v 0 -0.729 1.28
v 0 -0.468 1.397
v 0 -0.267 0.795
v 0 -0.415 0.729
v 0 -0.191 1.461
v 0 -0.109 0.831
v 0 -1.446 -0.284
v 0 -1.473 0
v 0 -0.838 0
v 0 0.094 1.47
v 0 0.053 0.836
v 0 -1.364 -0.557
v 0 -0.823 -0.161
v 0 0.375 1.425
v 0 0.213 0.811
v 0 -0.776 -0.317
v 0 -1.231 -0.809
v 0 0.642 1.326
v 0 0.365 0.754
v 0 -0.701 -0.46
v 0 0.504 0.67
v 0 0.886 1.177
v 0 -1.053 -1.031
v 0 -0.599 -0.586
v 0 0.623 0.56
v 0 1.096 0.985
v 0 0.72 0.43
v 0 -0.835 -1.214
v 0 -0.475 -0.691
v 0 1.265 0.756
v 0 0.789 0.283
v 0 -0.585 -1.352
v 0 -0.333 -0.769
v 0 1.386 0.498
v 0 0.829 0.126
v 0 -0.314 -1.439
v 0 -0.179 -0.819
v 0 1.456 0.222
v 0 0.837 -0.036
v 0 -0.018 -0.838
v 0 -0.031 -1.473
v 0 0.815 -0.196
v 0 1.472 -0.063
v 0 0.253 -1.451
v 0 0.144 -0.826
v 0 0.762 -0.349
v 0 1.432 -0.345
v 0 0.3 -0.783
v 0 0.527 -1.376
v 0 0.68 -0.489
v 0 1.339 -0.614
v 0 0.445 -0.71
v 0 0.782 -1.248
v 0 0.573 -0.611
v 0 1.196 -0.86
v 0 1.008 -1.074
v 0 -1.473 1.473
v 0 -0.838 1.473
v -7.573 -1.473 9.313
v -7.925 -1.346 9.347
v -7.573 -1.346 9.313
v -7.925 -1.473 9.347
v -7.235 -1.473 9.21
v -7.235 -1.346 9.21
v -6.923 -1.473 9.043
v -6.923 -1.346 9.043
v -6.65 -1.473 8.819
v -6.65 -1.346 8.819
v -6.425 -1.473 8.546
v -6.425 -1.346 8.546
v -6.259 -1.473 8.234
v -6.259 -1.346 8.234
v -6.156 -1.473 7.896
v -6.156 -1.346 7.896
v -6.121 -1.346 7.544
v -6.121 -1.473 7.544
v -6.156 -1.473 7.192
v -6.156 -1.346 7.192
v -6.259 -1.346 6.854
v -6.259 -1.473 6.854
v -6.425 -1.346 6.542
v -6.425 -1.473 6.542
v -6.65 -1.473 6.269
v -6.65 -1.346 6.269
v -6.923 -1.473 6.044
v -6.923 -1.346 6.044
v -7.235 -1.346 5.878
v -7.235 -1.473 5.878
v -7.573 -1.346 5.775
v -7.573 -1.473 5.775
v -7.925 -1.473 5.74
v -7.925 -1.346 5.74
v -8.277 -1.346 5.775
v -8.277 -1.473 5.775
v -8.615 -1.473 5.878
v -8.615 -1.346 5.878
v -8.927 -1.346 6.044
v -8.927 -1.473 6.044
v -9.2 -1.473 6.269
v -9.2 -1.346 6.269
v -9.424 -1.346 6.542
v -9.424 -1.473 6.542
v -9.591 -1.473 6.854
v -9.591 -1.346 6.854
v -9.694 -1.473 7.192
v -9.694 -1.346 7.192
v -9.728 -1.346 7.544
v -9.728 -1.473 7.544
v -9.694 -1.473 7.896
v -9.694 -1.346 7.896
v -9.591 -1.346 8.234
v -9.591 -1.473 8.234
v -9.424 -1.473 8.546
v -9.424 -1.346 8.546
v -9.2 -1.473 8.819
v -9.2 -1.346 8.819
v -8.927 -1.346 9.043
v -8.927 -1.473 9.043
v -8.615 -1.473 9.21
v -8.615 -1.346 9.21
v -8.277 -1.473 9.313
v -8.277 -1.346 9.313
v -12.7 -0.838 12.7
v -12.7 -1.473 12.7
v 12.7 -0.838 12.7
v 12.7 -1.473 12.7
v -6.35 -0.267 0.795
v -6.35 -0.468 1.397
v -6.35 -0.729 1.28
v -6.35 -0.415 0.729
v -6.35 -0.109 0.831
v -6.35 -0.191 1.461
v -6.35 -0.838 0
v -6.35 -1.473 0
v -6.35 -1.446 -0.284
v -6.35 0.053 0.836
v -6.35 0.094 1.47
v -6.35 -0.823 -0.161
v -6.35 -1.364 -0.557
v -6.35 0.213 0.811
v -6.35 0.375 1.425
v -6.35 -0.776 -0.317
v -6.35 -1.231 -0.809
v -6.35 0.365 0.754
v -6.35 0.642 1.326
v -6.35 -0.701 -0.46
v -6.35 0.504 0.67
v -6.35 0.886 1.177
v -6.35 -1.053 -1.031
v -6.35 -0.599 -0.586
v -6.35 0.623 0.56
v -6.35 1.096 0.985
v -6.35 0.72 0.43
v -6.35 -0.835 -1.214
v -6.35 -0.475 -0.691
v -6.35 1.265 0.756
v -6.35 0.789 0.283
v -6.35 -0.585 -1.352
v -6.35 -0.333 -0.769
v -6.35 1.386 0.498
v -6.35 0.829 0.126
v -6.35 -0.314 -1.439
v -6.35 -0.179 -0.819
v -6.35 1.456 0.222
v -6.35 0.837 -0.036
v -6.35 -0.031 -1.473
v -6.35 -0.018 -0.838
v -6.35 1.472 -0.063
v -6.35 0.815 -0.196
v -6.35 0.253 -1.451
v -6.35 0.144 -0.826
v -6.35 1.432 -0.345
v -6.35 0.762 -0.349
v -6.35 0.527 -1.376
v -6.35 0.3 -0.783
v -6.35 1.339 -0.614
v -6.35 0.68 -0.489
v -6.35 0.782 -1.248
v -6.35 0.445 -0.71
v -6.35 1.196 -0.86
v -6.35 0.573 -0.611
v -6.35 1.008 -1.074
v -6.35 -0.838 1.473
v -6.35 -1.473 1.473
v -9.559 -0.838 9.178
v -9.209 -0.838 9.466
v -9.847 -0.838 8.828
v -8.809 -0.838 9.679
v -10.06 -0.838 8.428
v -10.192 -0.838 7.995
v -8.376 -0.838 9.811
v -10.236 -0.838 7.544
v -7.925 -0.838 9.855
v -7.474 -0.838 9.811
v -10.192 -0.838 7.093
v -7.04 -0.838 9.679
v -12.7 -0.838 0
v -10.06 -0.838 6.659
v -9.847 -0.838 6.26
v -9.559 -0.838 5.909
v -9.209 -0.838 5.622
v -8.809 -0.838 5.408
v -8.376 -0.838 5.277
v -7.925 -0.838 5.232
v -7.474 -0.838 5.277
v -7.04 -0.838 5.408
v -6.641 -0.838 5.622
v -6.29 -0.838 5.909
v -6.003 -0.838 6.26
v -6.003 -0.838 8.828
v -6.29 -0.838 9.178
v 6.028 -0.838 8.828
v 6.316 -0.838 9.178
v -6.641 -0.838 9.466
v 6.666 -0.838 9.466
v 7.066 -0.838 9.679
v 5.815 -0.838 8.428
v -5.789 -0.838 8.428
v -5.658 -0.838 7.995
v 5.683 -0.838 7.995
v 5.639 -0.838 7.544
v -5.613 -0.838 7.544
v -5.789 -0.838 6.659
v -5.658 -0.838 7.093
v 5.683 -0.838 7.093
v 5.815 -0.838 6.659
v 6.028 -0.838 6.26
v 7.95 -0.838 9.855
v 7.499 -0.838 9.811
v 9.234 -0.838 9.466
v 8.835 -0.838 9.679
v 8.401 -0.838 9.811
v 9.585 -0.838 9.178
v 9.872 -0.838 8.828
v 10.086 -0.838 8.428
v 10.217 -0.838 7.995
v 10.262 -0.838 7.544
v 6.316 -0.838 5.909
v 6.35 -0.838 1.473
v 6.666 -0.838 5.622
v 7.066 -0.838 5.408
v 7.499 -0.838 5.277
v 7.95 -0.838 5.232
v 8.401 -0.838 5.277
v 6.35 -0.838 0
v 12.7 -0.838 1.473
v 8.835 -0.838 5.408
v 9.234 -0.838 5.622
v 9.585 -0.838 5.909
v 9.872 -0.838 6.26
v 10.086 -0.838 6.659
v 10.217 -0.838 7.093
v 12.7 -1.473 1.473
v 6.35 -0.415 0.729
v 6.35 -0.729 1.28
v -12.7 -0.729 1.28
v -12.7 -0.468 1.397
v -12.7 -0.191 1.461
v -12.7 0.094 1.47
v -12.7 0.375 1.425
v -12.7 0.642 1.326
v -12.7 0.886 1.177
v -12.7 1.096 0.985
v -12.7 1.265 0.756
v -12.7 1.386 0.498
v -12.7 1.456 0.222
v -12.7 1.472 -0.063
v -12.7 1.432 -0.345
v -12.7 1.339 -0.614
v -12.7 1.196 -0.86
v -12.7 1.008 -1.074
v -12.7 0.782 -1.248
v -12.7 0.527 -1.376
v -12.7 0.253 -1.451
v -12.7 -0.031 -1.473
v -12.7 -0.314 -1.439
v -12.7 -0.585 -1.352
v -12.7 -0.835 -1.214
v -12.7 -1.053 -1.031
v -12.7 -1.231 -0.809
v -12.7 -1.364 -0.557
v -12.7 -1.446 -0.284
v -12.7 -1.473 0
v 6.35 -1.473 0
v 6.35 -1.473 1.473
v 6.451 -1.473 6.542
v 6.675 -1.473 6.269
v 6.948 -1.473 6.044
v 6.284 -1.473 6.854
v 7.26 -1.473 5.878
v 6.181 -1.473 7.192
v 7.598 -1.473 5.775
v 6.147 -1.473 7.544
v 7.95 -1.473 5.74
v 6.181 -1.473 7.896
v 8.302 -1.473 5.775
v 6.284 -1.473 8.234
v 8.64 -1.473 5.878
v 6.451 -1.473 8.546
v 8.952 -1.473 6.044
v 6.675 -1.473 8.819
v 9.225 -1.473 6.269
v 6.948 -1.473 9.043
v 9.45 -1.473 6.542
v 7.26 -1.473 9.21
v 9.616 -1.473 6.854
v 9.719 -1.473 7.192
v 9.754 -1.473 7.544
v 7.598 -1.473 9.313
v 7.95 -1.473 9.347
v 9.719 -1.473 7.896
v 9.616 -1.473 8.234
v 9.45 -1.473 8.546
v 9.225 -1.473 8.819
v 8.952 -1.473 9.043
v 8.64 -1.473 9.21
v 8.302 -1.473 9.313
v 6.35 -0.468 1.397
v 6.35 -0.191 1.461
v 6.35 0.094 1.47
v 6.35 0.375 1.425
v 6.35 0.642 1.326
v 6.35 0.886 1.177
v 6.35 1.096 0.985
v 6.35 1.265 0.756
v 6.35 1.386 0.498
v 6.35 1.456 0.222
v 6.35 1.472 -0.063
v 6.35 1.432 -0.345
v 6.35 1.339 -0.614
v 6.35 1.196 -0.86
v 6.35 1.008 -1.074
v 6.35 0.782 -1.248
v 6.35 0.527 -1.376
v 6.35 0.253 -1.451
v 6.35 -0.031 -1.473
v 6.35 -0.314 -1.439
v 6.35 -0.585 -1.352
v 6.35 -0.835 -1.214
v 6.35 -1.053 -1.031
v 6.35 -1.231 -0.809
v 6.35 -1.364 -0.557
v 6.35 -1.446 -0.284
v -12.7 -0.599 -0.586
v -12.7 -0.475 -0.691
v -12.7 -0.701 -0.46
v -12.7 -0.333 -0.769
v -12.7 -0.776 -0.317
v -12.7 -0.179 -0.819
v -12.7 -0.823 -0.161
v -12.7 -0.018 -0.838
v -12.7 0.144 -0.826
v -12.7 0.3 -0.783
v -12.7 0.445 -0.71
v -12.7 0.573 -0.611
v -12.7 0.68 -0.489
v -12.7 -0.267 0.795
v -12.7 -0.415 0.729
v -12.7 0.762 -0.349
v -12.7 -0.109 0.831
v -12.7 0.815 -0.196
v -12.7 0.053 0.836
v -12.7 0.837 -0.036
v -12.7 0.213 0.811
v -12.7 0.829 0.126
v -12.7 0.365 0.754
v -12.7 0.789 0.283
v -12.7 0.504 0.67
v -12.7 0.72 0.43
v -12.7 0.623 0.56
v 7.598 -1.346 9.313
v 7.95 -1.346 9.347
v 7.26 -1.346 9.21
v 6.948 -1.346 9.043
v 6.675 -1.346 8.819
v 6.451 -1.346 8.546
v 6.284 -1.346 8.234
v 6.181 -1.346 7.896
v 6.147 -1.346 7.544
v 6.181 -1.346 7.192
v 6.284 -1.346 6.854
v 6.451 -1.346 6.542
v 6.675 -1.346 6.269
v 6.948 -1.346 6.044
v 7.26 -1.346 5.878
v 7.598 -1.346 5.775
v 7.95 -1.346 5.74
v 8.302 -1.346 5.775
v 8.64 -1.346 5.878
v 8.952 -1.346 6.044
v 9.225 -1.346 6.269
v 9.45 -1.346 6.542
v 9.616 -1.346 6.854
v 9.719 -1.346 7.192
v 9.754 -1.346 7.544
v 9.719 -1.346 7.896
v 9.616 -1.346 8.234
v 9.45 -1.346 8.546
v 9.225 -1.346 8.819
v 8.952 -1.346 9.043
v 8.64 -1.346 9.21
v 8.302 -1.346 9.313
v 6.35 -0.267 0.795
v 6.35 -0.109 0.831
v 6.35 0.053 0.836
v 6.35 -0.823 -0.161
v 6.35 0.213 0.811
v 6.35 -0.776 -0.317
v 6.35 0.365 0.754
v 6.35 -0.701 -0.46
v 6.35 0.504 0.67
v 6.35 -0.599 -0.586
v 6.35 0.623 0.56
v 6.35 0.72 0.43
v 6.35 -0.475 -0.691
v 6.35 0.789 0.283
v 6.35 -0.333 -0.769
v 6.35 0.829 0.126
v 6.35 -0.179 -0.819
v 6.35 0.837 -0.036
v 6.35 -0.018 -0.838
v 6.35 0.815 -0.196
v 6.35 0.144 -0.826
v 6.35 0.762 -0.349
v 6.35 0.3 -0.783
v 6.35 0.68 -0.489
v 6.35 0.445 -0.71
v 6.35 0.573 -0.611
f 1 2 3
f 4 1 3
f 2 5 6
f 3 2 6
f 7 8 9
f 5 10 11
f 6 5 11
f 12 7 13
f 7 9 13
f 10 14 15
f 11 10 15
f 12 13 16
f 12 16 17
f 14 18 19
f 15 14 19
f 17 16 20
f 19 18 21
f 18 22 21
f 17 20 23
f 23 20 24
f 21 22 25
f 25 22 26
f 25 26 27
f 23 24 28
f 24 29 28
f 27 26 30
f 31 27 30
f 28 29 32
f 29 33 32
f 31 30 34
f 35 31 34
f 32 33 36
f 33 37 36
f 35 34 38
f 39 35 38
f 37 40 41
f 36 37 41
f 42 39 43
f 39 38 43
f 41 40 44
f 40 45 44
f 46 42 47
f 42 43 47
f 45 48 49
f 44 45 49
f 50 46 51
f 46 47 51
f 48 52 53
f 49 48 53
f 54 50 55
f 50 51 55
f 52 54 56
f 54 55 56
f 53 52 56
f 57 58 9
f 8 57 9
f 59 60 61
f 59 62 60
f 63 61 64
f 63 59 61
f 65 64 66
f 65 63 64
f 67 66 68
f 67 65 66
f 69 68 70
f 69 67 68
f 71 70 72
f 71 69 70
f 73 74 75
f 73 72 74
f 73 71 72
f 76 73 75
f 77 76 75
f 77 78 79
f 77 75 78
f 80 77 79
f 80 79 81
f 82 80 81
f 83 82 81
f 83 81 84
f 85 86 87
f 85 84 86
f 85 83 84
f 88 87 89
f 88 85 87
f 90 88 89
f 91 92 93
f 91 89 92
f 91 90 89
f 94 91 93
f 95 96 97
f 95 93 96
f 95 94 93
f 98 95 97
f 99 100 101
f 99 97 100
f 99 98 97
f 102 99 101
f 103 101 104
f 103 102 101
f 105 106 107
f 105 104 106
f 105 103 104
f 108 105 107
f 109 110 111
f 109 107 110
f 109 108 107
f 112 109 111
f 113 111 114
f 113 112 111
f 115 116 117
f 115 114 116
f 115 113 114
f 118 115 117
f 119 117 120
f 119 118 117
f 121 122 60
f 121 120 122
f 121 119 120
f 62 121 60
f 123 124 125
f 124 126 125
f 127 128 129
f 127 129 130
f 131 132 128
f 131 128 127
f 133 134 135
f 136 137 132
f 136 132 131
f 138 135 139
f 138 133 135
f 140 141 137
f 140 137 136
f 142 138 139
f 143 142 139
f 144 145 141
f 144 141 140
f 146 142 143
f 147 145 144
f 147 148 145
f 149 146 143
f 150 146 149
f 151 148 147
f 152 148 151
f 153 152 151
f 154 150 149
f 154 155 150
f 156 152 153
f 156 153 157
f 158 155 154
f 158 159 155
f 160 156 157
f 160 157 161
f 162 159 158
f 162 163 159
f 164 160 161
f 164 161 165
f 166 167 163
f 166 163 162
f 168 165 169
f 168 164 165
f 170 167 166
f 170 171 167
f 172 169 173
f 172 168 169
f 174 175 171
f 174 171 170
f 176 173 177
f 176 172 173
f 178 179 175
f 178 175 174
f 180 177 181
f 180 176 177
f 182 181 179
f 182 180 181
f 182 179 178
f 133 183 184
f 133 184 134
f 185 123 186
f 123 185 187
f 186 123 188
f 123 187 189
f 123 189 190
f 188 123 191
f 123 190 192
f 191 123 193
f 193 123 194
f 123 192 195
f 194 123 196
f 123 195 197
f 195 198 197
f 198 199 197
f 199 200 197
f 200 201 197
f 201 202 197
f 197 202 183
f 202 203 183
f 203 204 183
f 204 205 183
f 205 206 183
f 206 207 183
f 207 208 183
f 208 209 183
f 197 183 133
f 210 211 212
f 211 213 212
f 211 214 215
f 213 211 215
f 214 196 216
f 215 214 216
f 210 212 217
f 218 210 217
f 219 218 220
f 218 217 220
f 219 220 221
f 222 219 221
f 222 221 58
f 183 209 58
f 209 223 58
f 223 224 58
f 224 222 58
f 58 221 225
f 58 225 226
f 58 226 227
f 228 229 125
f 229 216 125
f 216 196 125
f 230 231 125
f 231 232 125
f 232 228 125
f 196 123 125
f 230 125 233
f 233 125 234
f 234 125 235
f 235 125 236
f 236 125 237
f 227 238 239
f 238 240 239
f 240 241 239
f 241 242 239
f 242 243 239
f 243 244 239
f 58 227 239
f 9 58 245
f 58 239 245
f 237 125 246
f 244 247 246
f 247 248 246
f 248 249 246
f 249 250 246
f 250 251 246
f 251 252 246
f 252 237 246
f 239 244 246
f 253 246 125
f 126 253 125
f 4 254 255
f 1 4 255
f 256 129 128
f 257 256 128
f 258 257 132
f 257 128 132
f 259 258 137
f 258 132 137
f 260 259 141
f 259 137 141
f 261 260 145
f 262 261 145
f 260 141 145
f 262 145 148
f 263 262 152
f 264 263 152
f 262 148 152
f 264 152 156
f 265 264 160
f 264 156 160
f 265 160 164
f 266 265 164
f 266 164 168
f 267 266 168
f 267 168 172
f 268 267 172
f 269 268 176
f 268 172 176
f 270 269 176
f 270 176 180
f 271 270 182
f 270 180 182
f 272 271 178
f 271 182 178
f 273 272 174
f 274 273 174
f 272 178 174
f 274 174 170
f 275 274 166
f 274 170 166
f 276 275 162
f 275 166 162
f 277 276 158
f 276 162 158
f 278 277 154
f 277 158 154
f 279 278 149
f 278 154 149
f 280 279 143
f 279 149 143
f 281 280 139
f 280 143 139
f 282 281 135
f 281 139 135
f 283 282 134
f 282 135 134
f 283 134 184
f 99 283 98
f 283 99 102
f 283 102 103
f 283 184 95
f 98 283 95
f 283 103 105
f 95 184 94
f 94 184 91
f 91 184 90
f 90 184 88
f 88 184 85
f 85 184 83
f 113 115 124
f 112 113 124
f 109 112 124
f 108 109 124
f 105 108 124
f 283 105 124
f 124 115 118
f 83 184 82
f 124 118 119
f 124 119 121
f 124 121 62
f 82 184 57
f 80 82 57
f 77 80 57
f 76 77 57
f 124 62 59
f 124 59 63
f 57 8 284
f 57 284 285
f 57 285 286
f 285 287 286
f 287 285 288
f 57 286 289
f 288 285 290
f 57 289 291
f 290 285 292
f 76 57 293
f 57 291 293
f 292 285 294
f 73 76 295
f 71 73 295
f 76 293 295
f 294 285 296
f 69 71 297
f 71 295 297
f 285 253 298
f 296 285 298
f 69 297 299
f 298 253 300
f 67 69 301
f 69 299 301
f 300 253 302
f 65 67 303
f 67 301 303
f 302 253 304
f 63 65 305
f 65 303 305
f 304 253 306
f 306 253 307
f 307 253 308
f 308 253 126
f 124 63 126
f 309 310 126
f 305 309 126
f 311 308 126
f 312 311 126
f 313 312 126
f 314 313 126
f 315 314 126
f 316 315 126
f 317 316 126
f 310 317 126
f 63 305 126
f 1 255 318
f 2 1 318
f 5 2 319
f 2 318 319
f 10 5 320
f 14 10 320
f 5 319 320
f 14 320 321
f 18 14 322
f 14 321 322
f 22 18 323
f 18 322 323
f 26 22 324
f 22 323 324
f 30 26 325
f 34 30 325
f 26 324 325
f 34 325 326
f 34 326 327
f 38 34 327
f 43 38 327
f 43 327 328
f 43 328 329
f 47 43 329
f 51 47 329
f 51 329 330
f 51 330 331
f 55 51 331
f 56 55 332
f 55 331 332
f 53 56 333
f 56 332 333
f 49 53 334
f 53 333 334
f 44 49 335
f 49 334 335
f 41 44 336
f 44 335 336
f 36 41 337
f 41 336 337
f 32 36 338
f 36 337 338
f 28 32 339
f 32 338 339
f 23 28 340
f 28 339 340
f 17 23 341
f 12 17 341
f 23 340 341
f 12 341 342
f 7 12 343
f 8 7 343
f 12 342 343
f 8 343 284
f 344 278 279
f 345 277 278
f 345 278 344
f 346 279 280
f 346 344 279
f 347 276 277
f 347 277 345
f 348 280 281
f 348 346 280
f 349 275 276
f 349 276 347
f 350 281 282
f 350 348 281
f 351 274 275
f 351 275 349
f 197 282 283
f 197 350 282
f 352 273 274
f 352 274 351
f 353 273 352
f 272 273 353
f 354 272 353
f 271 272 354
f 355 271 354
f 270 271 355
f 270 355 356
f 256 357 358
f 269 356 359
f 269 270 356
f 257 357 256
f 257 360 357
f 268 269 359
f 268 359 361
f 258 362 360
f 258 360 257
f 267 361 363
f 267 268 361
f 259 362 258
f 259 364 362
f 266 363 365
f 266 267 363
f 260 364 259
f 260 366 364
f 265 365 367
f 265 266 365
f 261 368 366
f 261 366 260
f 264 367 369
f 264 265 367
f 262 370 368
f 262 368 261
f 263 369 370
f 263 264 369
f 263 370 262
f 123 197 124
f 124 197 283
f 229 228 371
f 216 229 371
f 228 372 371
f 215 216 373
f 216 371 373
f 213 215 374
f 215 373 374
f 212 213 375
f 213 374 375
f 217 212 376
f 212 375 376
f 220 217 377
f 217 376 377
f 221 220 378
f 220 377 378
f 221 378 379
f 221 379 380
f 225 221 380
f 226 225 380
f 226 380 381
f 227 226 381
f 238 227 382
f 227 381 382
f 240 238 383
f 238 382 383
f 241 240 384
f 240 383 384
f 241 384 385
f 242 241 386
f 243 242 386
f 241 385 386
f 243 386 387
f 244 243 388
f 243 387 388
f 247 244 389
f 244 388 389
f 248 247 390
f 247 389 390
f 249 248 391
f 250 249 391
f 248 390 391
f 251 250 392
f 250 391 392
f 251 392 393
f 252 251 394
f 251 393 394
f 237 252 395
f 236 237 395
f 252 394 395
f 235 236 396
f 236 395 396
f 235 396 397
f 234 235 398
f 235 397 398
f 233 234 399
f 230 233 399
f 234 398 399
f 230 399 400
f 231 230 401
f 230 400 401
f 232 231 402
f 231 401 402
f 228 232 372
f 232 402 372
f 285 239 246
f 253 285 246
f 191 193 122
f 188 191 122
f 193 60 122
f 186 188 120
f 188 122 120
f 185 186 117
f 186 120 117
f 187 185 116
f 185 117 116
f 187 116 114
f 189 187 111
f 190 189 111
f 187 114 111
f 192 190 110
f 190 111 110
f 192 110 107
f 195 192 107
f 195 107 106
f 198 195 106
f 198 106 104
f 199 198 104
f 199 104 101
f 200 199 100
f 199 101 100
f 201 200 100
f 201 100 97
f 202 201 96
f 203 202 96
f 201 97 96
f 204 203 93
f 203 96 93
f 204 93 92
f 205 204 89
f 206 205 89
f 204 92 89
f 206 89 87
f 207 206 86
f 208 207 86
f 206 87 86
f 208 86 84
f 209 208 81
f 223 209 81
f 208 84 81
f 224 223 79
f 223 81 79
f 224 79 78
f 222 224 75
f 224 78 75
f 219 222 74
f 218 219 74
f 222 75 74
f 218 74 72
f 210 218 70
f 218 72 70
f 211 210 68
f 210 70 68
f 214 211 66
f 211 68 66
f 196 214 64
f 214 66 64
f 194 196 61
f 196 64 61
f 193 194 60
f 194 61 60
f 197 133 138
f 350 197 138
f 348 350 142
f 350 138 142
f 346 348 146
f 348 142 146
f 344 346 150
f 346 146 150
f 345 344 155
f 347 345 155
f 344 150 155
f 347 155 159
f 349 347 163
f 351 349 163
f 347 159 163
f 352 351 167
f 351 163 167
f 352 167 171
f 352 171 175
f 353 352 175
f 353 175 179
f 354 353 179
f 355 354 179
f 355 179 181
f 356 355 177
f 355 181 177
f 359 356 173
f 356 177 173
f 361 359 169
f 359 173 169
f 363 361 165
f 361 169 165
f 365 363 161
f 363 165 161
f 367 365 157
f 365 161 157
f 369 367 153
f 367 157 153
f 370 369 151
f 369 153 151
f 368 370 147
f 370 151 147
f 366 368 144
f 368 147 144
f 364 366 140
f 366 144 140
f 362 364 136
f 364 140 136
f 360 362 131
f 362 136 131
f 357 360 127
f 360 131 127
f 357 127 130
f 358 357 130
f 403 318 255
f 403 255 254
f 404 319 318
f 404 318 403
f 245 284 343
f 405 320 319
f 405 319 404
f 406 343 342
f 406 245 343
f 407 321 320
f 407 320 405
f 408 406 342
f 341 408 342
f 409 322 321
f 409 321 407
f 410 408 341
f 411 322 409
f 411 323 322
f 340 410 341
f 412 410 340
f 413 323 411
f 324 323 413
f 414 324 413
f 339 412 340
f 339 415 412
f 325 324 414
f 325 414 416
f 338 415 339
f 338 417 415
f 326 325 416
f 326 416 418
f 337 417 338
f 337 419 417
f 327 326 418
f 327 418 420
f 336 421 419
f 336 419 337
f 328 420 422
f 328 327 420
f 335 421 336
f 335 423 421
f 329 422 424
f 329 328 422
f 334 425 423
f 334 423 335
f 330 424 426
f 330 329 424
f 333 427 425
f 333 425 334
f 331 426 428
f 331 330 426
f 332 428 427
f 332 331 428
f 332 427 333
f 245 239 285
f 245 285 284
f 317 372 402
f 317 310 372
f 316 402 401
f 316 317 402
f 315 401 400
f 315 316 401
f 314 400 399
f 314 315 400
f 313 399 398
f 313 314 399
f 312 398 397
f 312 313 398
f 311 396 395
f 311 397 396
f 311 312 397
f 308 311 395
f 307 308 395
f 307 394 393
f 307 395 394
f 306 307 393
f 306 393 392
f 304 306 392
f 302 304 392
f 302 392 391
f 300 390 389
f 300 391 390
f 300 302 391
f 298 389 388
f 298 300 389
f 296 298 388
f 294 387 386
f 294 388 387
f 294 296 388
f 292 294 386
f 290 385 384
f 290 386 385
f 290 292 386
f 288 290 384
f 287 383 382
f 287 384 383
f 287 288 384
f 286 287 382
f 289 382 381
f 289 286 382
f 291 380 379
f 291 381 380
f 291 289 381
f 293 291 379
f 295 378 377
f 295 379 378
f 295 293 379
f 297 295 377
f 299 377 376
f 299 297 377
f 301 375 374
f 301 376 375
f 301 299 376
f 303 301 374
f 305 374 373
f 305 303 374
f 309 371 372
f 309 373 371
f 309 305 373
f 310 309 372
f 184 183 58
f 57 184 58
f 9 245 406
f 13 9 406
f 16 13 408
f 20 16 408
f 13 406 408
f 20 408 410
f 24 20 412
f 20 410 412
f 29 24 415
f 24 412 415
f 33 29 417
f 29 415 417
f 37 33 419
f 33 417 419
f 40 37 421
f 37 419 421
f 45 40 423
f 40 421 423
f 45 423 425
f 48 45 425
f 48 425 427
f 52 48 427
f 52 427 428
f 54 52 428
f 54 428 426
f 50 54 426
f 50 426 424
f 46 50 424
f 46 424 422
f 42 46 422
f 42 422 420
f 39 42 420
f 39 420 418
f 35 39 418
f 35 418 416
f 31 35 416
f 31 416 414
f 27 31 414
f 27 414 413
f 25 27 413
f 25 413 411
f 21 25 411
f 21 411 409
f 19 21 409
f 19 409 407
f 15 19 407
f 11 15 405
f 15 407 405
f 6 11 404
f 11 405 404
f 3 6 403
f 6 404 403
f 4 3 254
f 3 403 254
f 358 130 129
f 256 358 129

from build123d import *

# Parameters (mm, degrees)
BOSS_EXTRUDE1_DEPTH     = 12.7
SKETCH4_W               = 6.35
SKETCH4_H               = 2.9464
CUT_EXTRUDE1_DEPTH      = 19.020830121
LPATTERN1_COUNT         = 6
LPATTERN1_PITCH         = 12.7
CUT_EXTRUDE3_DEPTH      = 19.020830121
CUT_EXTRUDE3_DEPTH_BACK = 19.020830121
SKETCH9_R               = 1.8034


with BuildPart() as part:
    # Sketch3 → Boss-Extrude1 (new, symmetric)
    with BuildSketch(Plane(origin=(0, 0, 0), x_dir=(0, 0, -1), z_dir=(1, 0, 0))):
        with BuildLine():
            Line((0, -1.4732), (-12.7, -1.4732))
            Line((-12.7, -1.4732), (-12.7, -0.8382))
            Line((-12.7, -0.8382), (0, -0.8382))
            ThreePointArc((0, -0.8382), (0.421388638, 0.724576328), (-0.728533124, -0.414510226))
            Line((-0.728533124, -0.414510226), (-1.280452157, -0.728533124))
            ThreePointArc((-1.280452157, -0.728533124), (0.740622455, 1.273497789), (0, -1.4732))
        make_face()
    extrude(amount=BOSS_EXTRUDE1_DEPTH, both=True)

    # Sketch4 → Cut-Extrude1 (cut, symmetric)
    with BuildSketch(Plane(origin=(0, 0, 0), x_dir=(1, 0, 0), z_dir=(0, 1, 0))):
        with Locations((-3.175, 0)):
            Rectangle(SKETCH4_W, SKETCH4_H)
    cut_extrude1 = extrude(amount=CUT_EXTRUDE1_DEPTH, both=True, mode=Mode.SUBTRACT)

    # LPattern1: Cut-Extrude1 ×6
    with Locations(*[(i * LPATTERN1_PITCH, 0, 0) for i in range(1, LPATTERN1_COUNT)]):
        add(cut_extrude1, mode=Mode.SUBTRACT)

    # Cut-Extrude2 cone 1 section (through the dimple's axis) → Cut-Extrude2 (revolve, cut)
    with BuildSketch(Plane(origin=(7.9502, -0.8382, 7.5438), x_dir=(0, 0, 1), z_dir=(1, 0, 0))):
        Polygon((0, 0), (2.3114, 0), (0, 2.3114), align=None)
    revolve(axis=Axis((7.9502, -0.8382, 7.5438), (0, -1, 0)), mode=Mode.SUBTRACT)

    # Cut-Extrude2 cone 2 section (through the dimple's axis) → Cut-Extrude2 cone 2 (revolve, cut)
    with BuildSketch(Plane(origin=(-7.9248, -0.8382, 7.5438), x_dir=(0, 0, 1), z_dir=(1, 0, 0))):
        Polygon((0, 0), (2.3114, 0), (0, 2.3114), align=None)
    revolve(axis=Axis((-7.9248, -0.8382, 7.5438), (0, -1, 0)), mode=Mode.SUBTRACT)

    # Sketch9 → Cut-Extrude3 (cut, two sides: drawn at the far end of the back side and taken through both)
    with BuildSketch(Plane(origin=(0, 0, 0), x_dir=(1, 0, 0), z_dir=(0, 1, 0)).offset(-CUT_EXTRUDE3_DEPTH_BACK)):
        with Locations(Location((7.9502, -7.5438, 0), (0, 0, 270))):
            Circle(SKETCH9_R)
        with Locations(Location((-7.9248, -7.5438, 0), (0, 0, 270))):
            Circle(SKETCH9_R)
    extrude(amount=CUT_EXTRUDE3_DEPTH + CUT_EXTRUDE3_DEPTH_BACK, mode=Mode.SUBTRACT)


solid = part.part
